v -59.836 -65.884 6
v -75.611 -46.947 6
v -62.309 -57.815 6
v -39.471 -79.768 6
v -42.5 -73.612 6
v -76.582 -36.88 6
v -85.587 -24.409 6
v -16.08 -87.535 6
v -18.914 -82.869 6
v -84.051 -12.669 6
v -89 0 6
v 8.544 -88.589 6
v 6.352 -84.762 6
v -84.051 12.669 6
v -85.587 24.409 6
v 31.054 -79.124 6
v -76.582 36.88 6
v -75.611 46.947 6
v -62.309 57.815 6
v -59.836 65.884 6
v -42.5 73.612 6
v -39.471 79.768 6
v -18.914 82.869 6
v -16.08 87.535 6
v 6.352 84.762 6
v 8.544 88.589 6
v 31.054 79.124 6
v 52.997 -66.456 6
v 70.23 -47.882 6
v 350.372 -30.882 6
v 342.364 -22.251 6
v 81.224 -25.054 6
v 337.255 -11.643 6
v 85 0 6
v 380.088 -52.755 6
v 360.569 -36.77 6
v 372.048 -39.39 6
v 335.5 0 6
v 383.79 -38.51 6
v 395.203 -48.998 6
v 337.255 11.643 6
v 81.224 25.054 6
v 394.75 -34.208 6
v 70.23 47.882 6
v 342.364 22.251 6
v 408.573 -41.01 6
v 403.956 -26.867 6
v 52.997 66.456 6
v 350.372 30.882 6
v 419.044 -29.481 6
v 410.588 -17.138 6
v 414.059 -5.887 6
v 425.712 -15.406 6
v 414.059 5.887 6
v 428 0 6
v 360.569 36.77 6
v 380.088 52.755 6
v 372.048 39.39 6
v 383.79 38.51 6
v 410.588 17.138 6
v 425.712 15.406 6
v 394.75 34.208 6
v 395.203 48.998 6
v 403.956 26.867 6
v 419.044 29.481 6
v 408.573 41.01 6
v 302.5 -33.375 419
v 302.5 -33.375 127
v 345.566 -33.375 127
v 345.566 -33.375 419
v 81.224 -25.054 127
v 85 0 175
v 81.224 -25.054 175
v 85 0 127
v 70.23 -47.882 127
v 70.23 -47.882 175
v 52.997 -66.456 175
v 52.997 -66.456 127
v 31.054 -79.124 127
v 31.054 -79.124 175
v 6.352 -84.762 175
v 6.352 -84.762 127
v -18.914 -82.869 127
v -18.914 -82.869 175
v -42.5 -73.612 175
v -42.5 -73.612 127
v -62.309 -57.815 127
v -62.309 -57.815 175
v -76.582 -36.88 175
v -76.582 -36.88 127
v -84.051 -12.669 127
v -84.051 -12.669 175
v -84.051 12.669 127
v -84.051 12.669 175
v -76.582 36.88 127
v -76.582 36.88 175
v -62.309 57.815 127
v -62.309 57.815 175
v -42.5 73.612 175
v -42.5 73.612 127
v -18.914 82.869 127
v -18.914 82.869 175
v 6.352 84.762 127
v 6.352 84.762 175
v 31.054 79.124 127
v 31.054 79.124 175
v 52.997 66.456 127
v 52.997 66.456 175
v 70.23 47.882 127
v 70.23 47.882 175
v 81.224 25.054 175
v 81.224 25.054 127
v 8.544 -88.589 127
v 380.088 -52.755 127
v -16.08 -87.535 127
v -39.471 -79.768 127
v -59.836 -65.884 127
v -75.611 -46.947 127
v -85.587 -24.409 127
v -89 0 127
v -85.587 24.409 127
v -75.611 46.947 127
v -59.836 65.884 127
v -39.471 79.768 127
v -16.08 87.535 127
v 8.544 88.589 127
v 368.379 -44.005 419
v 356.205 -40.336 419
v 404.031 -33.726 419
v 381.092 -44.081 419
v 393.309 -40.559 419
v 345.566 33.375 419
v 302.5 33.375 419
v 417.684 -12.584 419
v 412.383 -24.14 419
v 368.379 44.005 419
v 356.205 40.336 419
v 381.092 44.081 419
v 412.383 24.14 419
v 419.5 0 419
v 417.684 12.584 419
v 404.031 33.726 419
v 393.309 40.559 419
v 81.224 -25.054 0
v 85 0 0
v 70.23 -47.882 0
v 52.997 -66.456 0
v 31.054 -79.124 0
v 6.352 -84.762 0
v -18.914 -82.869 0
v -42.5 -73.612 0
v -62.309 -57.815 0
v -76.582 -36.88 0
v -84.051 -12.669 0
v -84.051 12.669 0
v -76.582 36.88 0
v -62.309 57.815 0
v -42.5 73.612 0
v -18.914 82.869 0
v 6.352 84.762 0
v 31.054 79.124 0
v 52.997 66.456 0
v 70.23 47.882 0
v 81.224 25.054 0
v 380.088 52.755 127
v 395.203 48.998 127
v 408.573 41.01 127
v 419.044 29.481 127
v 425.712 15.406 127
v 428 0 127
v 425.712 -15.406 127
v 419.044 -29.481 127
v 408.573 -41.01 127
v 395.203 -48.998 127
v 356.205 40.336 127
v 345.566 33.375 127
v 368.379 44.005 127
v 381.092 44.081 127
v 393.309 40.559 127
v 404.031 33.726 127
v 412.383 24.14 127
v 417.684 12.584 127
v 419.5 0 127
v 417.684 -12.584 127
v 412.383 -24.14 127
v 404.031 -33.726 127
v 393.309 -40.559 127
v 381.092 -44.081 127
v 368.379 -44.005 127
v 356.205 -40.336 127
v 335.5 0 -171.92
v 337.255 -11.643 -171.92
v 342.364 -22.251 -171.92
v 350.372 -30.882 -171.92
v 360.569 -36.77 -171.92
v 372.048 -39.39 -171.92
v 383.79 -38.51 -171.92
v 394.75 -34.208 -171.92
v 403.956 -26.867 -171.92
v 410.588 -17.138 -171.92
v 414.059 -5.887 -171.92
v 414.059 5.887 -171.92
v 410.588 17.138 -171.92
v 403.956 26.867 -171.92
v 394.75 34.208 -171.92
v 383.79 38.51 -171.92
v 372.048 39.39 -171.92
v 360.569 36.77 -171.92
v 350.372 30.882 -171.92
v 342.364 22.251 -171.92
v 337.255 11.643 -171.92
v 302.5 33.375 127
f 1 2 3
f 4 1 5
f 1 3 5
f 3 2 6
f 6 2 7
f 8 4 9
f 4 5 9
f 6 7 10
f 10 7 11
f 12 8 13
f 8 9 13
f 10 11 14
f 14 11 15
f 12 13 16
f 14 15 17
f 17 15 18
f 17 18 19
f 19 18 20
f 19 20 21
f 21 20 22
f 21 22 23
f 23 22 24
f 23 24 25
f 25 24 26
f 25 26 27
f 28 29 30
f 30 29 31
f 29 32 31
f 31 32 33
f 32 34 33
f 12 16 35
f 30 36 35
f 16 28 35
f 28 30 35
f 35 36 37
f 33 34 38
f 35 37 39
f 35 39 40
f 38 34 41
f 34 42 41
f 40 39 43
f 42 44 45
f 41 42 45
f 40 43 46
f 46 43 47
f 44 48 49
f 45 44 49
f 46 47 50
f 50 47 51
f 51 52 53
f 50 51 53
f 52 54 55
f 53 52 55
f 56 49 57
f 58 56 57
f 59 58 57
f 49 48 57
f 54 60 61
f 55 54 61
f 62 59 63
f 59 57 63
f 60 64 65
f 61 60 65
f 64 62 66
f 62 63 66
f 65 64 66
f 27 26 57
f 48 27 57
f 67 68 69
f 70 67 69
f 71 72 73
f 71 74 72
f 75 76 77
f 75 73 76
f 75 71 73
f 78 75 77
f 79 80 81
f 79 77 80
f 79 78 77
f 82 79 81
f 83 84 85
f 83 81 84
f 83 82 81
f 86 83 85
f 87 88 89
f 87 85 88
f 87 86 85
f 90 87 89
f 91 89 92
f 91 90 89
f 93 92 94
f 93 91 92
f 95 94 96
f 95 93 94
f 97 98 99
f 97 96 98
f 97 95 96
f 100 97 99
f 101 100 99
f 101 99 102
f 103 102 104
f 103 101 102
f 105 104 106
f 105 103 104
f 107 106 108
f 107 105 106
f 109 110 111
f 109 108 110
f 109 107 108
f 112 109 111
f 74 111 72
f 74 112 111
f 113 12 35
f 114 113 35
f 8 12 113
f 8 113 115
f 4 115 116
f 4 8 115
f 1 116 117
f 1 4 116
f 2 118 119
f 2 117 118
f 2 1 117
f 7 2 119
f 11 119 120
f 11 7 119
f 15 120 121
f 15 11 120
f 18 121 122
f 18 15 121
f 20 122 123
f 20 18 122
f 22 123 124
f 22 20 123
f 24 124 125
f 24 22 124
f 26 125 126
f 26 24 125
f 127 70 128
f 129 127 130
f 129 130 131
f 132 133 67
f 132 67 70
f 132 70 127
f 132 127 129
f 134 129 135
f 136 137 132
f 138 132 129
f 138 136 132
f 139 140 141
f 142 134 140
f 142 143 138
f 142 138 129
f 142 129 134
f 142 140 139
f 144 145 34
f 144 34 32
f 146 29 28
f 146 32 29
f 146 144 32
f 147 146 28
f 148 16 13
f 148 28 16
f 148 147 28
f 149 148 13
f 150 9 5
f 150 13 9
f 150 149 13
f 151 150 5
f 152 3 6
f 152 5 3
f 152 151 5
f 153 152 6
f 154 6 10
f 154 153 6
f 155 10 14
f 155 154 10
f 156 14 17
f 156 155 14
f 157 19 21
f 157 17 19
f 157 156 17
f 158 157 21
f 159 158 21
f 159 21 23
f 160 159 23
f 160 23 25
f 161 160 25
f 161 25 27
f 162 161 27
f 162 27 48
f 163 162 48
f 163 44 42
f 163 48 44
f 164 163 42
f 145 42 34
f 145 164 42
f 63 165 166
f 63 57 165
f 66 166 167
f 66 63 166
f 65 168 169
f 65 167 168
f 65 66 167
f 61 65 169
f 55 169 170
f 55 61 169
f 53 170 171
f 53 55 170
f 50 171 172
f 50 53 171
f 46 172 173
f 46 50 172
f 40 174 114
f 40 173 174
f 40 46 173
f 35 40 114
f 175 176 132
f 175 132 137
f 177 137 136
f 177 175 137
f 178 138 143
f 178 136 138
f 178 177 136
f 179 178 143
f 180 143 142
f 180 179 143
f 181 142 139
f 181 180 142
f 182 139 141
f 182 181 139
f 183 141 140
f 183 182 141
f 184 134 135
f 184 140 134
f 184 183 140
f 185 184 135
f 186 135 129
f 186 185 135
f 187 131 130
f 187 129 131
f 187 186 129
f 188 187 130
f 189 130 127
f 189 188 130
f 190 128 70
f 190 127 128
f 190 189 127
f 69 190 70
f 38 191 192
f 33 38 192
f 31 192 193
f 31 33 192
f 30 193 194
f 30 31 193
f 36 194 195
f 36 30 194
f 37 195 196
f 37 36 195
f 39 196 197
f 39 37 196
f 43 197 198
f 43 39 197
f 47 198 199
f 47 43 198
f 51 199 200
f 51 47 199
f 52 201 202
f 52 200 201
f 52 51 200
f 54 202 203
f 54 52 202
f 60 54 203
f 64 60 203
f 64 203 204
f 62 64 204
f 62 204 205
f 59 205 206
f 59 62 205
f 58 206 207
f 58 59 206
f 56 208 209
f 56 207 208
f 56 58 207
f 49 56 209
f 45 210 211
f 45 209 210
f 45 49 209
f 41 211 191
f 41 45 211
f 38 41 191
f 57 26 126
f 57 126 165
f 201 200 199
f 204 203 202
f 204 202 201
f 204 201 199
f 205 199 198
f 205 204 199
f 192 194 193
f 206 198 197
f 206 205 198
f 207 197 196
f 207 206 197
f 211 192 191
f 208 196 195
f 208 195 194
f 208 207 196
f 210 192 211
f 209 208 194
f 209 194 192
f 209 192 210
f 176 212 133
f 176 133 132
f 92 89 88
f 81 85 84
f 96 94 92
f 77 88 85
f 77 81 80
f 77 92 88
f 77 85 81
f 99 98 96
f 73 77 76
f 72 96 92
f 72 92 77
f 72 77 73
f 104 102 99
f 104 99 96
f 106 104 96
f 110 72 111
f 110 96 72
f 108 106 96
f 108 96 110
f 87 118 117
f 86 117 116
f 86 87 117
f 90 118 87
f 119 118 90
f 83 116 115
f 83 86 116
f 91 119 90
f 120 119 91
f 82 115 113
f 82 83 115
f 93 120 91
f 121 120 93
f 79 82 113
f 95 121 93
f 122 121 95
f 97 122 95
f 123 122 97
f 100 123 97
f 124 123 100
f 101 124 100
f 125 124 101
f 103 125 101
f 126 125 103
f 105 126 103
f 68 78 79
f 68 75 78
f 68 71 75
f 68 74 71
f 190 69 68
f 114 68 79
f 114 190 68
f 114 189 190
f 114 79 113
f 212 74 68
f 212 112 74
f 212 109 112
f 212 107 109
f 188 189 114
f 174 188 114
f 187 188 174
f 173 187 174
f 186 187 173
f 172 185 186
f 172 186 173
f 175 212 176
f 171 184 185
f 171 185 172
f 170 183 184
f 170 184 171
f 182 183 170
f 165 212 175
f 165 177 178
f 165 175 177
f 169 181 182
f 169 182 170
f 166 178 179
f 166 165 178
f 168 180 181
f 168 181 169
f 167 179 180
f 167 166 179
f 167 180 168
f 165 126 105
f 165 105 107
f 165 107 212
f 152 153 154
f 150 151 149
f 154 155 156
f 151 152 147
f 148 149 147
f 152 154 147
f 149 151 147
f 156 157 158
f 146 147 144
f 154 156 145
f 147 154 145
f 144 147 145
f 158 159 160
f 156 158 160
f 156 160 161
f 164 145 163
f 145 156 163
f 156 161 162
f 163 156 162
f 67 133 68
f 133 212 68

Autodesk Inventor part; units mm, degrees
ref_plane "YZ Plane" through (0, 0, 0) normal (1, 0, 0) x (0, 1, 0)
ref_plane "XZ Plane" through (0, 0, 0) normal (0, 1, 0) x (-1, 0, 0)
ref_plane "XY Plane" through (0, 0, 0) normal (0, 0, 1) x (1, 0, 0)
sketch "Sketch1" plane through (0, 0, 0) normal (0, 0, 1) x (1, 0, 0)
  circle A0 centre (0, 0) radius 85
  dimension "d0" = 170
extrude "Extrusion1" add sketch "Sketch1" along normal blind 6
sketch "Sketch2" plane through (0, 0, 6) normal (0, 0, 1) x (1, 0, 0)
  circle A0 centre (0, 0) radius 89 construction
  circle A1 centre (375, 0) radius 53 construction
  line L0 (8.544, 88.5889) -> (380.088, 52.7552)
  line L1 (8.544, -88.5889) -> (380.088, -52.7552)
  arc A2 (8.544, 88.5889) -> (8.544, -88.5889) centre (0, 0) ccw
  arc A3 (380.088, -52.7552) -> (380.088, 52.7552) centre (375, 0) ccw
  dimension "d3" = 178
  dimension "d4" = 106
  dimension "d5" = 375
extrude "Extrusion2" add sketch "Sketch2" along normal blind 121
sketch "Sketch3" plane through (0, 0, 127) normal (0, 0, 1) x (1, 0, 0)
  circle A0 centre (0, 0) radius 85
  dimension "d8" = 170
extrude "Extrusion3" add sketch "Sketch3" along normal blind 48
sketch "Sketch4" plane through (0, 0, 127) normal (0, 0, 1) x (1, 0, 0)
  arc A0 (380.088, -52.7552) -> (380.088, 52.7552) centre (375, 0) ccw construction
  circle A1 centre (375, 0) radius 44.5 construction
  line L0 (302.5, 33.375) -> (302.5, -33.375)
  line L1 (302.5, 33.375) -> (345.566, 33.375)
  line L2 (302.5, -33.375) -> (345.566, -33.375)
  arc A2 (345.566, -33.375) -> (345.566, 33.375) centre (375, 0) ccw
  point P0 (0, 0)
  point P1 (302.5, 0)
  dimension "d11" = 89
  dimension "d12" = 66.75
  dimension "d13" = 72.5
extrude "Extrusion4" add sketch "Sketch4" along normal blind 292
sketch "Sketch5" plane through (0, 0, 6) normal (0, 0, -1) x (-1, 0, 0)
  arc A0 (-380.088, 52.7552) -> (-380.088, -52.7552) centre (-375, 0) ccw construction
  circle A1 centre (-375, 0) radius 39.5
  point P0 (0, 0)
  dimension "d16" = 79
extrude "Extrusion5" add sketch "Sketch5" along normal blind 177.92
properties part number "2"
